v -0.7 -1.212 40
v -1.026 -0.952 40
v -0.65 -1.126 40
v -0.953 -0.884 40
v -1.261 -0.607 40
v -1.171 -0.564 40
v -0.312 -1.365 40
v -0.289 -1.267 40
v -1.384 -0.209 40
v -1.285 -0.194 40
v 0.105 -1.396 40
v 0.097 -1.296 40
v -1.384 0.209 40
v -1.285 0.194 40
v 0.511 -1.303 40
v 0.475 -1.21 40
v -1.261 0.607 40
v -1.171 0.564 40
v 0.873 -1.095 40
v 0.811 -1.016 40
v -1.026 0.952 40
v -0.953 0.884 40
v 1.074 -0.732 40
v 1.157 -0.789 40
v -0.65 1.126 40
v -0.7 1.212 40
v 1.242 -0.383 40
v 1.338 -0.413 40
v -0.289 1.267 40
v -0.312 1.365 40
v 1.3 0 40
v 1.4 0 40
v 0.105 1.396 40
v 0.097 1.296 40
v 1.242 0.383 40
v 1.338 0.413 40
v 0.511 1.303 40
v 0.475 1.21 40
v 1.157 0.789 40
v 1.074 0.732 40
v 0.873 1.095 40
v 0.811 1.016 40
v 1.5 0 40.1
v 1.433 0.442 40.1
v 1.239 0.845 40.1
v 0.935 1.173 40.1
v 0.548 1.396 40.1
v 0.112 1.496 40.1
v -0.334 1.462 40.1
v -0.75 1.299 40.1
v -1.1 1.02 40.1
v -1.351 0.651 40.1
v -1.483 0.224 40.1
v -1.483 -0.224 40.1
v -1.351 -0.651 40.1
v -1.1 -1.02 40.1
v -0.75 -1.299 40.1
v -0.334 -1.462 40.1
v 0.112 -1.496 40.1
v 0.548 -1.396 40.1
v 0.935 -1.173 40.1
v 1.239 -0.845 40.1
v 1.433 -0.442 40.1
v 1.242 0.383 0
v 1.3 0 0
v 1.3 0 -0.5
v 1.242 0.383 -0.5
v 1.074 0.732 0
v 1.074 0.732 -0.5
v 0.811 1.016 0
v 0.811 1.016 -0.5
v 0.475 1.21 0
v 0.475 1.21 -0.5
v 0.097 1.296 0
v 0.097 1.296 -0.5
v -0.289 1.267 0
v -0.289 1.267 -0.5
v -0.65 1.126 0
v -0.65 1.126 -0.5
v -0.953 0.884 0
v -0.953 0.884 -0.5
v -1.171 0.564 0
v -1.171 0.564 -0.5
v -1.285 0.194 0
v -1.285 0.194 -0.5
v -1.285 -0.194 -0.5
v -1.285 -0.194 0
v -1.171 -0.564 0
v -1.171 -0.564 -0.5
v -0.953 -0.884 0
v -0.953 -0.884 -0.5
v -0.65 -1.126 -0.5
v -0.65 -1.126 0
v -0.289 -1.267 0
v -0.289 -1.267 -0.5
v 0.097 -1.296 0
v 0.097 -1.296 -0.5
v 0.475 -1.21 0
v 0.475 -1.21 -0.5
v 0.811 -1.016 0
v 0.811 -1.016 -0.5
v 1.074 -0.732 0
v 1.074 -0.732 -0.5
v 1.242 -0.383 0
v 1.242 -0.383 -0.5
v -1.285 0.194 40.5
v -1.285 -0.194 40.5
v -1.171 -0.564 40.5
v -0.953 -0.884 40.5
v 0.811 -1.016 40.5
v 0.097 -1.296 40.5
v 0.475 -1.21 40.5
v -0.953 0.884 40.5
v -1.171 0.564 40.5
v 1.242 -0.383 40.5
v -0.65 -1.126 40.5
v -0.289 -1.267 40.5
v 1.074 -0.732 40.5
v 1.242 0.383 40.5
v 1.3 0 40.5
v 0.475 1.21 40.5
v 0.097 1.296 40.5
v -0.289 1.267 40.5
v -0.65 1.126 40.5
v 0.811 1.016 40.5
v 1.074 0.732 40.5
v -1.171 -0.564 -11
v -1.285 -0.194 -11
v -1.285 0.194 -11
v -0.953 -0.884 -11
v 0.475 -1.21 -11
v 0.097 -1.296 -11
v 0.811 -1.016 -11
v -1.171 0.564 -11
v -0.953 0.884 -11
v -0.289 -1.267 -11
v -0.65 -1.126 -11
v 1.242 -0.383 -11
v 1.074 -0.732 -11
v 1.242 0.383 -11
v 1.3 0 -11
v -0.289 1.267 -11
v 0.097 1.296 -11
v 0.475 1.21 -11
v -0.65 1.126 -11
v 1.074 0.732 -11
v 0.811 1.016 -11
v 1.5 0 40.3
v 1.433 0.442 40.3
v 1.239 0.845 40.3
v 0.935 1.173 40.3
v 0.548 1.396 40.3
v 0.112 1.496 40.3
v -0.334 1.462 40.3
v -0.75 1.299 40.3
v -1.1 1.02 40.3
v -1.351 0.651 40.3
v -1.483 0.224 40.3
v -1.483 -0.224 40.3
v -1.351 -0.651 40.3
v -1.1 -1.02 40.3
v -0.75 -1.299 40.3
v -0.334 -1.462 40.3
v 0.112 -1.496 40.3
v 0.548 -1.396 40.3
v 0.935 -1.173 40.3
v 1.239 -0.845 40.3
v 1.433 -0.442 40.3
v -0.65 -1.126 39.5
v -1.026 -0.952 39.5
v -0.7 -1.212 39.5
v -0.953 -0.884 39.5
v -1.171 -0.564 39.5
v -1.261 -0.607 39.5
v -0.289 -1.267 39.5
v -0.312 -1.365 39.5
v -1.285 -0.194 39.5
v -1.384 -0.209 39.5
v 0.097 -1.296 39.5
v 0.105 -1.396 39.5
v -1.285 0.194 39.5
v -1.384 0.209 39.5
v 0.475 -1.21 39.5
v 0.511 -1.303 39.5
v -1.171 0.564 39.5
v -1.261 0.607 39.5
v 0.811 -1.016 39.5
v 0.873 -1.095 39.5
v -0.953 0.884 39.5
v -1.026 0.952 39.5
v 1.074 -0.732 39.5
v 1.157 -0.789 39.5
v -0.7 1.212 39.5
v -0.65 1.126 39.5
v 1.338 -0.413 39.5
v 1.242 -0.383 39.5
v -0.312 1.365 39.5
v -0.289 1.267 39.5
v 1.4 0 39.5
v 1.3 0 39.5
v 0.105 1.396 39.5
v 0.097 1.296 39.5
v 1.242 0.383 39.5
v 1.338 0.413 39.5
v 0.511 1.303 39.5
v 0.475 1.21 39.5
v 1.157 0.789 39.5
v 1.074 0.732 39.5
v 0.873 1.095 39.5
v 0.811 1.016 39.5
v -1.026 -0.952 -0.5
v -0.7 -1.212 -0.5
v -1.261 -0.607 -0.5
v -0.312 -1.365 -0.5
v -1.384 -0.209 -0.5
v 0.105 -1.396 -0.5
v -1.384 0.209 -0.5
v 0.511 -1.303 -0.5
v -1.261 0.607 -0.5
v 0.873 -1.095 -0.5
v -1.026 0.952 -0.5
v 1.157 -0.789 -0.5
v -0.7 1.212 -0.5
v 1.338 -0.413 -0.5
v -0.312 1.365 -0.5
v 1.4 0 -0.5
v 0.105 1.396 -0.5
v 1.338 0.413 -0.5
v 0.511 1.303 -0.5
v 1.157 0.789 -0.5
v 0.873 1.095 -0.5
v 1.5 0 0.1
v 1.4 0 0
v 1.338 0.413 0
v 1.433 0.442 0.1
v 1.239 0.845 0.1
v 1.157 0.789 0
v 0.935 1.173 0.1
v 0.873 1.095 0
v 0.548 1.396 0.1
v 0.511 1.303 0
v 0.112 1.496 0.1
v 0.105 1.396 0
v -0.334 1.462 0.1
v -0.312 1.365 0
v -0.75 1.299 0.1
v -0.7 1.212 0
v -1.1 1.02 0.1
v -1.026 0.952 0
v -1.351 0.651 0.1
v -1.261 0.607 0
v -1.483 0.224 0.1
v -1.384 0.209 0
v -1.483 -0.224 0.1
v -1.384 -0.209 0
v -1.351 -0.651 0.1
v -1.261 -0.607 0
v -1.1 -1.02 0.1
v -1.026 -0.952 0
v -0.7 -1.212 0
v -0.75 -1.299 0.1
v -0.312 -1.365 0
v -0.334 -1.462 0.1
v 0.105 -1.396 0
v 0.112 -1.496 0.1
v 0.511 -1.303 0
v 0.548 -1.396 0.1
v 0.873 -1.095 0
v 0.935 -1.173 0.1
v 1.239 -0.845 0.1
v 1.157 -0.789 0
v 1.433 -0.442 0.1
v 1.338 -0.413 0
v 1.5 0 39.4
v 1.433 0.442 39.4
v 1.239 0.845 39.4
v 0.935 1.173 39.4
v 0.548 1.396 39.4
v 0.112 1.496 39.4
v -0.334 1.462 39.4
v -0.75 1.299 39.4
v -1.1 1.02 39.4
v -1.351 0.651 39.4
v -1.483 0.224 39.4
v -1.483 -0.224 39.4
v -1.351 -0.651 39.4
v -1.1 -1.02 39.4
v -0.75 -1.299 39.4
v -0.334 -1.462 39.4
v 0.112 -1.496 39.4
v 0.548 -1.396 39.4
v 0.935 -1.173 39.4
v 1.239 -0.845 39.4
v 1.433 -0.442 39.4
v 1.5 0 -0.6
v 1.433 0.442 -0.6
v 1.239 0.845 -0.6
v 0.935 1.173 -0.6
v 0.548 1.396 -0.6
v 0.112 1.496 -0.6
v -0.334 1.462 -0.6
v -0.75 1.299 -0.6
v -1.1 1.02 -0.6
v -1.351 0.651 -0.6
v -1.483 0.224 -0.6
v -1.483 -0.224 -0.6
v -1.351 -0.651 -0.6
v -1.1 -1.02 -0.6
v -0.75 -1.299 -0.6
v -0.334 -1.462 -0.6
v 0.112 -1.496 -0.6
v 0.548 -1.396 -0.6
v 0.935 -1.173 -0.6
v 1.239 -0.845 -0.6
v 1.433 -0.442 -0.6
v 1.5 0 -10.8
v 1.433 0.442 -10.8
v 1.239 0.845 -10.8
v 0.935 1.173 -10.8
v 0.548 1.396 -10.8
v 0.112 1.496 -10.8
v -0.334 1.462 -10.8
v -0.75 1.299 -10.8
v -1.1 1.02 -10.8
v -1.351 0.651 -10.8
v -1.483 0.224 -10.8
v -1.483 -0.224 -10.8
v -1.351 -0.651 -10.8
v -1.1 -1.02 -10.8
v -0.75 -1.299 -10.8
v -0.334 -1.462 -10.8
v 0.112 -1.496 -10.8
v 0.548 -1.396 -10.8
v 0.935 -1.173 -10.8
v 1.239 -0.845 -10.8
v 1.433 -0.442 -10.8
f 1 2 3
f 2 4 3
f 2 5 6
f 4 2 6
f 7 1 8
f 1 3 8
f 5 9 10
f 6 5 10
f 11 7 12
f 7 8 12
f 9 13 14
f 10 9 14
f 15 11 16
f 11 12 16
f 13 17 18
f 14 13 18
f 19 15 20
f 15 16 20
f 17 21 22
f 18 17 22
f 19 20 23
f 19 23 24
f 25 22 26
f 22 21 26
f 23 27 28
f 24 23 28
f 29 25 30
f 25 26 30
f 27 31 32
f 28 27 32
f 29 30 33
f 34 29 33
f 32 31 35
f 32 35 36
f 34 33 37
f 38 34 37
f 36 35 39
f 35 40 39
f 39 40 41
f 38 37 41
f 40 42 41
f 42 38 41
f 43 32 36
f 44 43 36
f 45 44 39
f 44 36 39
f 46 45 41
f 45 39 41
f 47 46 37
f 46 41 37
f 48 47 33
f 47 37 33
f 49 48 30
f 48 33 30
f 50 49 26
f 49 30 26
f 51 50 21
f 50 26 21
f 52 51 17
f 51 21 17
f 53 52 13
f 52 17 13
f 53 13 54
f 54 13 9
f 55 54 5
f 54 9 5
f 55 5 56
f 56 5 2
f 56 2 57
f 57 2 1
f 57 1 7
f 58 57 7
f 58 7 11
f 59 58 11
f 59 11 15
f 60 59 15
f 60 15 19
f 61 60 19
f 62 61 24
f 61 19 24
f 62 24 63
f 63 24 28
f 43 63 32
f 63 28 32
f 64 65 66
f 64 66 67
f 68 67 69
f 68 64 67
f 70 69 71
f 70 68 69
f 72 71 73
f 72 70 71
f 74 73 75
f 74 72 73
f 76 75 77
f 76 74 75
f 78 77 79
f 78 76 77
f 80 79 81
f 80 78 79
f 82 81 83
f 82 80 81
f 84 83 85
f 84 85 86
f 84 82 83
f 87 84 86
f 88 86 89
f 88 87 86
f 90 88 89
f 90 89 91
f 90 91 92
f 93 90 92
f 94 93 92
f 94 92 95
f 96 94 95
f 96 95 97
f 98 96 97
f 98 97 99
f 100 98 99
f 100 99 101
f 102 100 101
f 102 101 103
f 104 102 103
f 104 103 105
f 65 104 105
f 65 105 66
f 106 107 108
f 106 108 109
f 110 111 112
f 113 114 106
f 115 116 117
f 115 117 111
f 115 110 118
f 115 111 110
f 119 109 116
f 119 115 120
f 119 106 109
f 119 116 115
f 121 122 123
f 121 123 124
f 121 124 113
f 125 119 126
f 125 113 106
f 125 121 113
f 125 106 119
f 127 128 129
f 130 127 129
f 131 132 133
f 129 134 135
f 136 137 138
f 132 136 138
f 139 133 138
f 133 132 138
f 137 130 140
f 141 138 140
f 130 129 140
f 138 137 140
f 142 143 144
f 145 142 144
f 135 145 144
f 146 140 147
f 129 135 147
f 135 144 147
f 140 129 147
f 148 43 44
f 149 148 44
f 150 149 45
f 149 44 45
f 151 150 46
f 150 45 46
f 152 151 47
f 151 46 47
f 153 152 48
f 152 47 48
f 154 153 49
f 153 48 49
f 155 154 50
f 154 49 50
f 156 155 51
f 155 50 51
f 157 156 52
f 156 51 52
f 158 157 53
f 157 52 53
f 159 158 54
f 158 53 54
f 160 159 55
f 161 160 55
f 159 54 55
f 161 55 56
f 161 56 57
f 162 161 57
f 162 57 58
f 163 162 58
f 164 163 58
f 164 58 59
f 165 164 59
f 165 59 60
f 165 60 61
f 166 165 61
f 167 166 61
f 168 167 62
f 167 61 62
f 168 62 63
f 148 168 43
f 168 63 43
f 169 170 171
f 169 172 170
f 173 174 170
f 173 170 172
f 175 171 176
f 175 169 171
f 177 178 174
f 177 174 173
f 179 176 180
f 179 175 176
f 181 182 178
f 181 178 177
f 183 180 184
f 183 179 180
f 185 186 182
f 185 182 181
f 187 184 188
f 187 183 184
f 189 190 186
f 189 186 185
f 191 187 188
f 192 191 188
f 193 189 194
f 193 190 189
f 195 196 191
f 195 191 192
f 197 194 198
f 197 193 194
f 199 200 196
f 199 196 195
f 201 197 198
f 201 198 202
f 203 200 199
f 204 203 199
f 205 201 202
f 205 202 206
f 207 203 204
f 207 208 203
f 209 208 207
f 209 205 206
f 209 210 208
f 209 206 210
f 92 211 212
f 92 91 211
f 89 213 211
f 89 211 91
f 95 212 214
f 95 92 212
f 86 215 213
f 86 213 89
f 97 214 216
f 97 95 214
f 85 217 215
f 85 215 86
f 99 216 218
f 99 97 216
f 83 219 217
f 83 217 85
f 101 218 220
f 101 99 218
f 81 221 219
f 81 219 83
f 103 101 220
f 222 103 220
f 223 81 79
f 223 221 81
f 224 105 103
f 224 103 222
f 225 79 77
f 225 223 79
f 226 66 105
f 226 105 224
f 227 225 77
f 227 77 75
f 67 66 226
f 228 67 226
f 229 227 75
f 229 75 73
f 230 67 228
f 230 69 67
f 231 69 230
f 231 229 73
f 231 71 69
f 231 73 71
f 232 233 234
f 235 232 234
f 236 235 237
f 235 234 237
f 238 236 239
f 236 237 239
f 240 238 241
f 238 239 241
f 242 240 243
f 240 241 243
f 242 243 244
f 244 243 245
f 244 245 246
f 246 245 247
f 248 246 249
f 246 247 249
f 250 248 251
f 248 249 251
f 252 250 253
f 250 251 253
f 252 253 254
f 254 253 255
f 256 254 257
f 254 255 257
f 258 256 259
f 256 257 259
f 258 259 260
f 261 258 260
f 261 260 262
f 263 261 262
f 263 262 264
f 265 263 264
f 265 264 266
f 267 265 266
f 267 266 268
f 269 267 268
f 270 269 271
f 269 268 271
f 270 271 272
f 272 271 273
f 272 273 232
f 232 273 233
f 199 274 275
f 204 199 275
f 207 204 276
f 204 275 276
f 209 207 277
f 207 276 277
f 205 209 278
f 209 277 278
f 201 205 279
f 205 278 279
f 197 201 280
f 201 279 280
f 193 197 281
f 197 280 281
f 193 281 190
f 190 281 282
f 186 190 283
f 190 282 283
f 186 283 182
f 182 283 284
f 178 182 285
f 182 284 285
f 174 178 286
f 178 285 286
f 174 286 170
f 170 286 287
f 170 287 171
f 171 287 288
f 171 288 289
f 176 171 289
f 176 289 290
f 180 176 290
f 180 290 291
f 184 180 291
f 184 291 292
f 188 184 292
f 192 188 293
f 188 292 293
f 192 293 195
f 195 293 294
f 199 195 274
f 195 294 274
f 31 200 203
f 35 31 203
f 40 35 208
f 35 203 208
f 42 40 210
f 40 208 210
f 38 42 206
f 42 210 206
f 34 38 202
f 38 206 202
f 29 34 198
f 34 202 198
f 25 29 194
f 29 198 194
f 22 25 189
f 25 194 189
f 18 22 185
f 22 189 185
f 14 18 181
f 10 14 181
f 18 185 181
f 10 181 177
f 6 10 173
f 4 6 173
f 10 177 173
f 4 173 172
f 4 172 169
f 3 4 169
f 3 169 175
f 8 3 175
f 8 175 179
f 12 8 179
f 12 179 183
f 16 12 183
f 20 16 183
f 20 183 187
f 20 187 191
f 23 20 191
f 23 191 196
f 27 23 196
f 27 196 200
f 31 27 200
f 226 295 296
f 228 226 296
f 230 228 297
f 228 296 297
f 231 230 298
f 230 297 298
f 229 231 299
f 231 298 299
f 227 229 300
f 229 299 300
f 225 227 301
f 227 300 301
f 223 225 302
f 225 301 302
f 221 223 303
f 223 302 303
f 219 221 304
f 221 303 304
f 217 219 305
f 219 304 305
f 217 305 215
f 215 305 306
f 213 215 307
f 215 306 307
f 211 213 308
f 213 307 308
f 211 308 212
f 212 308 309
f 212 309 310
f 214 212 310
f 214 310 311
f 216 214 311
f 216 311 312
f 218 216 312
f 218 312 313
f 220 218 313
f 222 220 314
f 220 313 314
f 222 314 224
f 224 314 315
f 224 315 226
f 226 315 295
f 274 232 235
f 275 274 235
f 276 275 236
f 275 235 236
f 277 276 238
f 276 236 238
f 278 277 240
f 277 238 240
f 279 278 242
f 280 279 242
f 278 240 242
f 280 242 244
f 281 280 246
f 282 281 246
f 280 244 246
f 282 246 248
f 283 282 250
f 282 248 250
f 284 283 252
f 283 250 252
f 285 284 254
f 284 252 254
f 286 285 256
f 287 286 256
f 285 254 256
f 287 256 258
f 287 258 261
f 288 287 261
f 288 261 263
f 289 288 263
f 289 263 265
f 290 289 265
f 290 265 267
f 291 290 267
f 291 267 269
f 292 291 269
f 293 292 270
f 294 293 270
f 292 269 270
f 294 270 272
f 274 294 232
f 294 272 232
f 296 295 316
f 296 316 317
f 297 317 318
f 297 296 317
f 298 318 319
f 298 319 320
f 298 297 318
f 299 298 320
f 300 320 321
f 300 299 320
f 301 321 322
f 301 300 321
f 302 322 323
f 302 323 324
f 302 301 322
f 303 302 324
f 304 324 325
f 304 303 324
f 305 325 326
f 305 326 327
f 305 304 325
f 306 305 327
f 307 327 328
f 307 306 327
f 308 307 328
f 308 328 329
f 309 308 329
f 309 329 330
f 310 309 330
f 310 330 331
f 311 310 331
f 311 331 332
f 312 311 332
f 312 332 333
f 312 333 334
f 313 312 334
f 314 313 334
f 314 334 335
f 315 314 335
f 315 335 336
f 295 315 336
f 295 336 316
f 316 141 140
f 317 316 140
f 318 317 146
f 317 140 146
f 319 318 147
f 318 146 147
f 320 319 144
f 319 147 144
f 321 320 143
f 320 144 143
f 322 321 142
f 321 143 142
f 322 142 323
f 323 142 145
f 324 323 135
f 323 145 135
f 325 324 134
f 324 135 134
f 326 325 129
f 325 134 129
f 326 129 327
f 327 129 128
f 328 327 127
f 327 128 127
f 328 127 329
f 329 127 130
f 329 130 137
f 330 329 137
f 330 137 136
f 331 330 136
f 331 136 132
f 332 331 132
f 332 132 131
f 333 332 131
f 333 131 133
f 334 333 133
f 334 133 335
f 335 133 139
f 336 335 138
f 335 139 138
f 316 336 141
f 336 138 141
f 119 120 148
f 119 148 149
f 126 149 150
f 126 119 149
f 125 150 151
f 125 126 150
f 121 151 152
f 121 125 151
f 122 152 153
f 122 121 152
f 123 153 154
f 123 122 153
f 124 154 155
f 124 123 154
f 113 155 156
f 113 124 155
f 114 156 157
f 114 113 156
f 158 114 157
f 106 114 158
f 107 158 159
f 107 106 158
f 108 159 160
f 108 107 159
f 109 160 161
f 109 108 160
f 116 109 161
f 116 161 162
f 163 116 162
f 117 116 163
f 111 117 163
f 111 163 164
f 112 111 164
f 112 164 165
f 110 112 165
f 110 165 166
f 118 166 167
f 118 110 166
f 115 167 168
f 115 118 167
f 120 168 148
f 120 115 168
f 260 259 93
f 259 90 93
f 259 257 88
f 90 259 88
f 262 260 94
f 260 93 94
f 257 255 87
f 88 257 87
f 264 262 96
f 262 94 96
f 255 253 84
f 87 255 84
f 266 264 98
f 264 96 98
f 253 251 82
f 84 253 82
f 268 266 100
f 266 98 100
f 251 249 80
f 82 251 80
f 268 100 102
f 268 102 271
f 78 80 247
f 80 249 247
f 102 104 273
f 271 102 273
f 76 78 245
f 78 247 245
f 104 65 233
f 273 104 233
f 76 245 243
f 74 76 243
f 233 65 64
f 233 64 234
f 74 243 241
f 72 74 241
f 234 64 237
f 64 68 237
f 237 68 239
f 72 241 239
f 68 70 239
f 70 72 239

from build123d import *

# Parameters (mm, degrees)
F0_R        = 1.5
F0_R_2      = 1.3
F1_DEPTH    = 39.5
F2_DEPTH    = 1
F3_START    = -0.5
F3_DEPTH    = 0.5
F4_DEPTH    = 10
F5_R        = 1.3
F6_DEPTH    = 1
F7_START    = 0.5
F1_FACE_R   = 1.5
F1_FACE_R_2 = 1.3
F7_DEPTH    = 0.5
F8_SIZE     = 0.2
F9_SIZE     = 0.1


with BuildPart() as f1:
    # F0 (on Top) → F1 (new body)
    with BuildSketch(Plane.XY):
        Circle(F0_R)
        Circle(F0_R_2, mode=Mode.SUBTRACT)
        Circle(F0_R_2)
    extrude(amount=F1_DEPTH)

    # F0 (on Top) → F2 (join)
    with BuildSketch(Plane.XY):
        Circle(F0_R_2)
    extrude(amount=-F2_DEPTH)

    # F0 (on Top) → F3 (join)
    with BuildSketch(Plane.XY.offset(F3_START)):
        Circle(F0_R)
        Circle(F0_R_2, mode=Mode.SUBTRACT)
    extrude(amount=-F3_DEPTH)

    # F4 (add): a face of the model
    f4_faces = [f1.faces().sort_by_distance(p)[0] for p in [
        (0, 0, -1),
    ]]
    extrude(f4_faces, amount=F4_DEPTH)

    # F5 (on face) → F6 (join)
    with BuildSketch(Plane.XY.offset(39.5)):
        Circle(F5_R)
    extrude(amount=F6_DEPTH)

    # F1_face (on face) → F7 (join)
    with BuildSketch(Plane.XY.offset(39.5).offset(F7_START)):
        Circle(F1_FACE_R)
        Circle(F1_FACE_R_2, mode=Mode.SUBTRACT)
    extrude(amount=F7_DEPTH)

    # F8
    f8_edges = [f1.edges().sort_by_distance(p)[0] for p in [
        (-1.5, 0, 40.5),
        (-1.5, 0, -11),
    ]]
    chamfer(f8_edges, length=F8_SIZE)

    # F9
    f9_edges = [f1.edges().sort_by_distance(p)[0] for p in [
        (-1.5, 0, 39.5),
        (-1.5, 0, 40),
        (-1.5, 0, 0),
        (-1.5, 0, -0.5),
    ]]
    chamfer(f9_edges, length=F9_SIZE)


solid = f1.part
